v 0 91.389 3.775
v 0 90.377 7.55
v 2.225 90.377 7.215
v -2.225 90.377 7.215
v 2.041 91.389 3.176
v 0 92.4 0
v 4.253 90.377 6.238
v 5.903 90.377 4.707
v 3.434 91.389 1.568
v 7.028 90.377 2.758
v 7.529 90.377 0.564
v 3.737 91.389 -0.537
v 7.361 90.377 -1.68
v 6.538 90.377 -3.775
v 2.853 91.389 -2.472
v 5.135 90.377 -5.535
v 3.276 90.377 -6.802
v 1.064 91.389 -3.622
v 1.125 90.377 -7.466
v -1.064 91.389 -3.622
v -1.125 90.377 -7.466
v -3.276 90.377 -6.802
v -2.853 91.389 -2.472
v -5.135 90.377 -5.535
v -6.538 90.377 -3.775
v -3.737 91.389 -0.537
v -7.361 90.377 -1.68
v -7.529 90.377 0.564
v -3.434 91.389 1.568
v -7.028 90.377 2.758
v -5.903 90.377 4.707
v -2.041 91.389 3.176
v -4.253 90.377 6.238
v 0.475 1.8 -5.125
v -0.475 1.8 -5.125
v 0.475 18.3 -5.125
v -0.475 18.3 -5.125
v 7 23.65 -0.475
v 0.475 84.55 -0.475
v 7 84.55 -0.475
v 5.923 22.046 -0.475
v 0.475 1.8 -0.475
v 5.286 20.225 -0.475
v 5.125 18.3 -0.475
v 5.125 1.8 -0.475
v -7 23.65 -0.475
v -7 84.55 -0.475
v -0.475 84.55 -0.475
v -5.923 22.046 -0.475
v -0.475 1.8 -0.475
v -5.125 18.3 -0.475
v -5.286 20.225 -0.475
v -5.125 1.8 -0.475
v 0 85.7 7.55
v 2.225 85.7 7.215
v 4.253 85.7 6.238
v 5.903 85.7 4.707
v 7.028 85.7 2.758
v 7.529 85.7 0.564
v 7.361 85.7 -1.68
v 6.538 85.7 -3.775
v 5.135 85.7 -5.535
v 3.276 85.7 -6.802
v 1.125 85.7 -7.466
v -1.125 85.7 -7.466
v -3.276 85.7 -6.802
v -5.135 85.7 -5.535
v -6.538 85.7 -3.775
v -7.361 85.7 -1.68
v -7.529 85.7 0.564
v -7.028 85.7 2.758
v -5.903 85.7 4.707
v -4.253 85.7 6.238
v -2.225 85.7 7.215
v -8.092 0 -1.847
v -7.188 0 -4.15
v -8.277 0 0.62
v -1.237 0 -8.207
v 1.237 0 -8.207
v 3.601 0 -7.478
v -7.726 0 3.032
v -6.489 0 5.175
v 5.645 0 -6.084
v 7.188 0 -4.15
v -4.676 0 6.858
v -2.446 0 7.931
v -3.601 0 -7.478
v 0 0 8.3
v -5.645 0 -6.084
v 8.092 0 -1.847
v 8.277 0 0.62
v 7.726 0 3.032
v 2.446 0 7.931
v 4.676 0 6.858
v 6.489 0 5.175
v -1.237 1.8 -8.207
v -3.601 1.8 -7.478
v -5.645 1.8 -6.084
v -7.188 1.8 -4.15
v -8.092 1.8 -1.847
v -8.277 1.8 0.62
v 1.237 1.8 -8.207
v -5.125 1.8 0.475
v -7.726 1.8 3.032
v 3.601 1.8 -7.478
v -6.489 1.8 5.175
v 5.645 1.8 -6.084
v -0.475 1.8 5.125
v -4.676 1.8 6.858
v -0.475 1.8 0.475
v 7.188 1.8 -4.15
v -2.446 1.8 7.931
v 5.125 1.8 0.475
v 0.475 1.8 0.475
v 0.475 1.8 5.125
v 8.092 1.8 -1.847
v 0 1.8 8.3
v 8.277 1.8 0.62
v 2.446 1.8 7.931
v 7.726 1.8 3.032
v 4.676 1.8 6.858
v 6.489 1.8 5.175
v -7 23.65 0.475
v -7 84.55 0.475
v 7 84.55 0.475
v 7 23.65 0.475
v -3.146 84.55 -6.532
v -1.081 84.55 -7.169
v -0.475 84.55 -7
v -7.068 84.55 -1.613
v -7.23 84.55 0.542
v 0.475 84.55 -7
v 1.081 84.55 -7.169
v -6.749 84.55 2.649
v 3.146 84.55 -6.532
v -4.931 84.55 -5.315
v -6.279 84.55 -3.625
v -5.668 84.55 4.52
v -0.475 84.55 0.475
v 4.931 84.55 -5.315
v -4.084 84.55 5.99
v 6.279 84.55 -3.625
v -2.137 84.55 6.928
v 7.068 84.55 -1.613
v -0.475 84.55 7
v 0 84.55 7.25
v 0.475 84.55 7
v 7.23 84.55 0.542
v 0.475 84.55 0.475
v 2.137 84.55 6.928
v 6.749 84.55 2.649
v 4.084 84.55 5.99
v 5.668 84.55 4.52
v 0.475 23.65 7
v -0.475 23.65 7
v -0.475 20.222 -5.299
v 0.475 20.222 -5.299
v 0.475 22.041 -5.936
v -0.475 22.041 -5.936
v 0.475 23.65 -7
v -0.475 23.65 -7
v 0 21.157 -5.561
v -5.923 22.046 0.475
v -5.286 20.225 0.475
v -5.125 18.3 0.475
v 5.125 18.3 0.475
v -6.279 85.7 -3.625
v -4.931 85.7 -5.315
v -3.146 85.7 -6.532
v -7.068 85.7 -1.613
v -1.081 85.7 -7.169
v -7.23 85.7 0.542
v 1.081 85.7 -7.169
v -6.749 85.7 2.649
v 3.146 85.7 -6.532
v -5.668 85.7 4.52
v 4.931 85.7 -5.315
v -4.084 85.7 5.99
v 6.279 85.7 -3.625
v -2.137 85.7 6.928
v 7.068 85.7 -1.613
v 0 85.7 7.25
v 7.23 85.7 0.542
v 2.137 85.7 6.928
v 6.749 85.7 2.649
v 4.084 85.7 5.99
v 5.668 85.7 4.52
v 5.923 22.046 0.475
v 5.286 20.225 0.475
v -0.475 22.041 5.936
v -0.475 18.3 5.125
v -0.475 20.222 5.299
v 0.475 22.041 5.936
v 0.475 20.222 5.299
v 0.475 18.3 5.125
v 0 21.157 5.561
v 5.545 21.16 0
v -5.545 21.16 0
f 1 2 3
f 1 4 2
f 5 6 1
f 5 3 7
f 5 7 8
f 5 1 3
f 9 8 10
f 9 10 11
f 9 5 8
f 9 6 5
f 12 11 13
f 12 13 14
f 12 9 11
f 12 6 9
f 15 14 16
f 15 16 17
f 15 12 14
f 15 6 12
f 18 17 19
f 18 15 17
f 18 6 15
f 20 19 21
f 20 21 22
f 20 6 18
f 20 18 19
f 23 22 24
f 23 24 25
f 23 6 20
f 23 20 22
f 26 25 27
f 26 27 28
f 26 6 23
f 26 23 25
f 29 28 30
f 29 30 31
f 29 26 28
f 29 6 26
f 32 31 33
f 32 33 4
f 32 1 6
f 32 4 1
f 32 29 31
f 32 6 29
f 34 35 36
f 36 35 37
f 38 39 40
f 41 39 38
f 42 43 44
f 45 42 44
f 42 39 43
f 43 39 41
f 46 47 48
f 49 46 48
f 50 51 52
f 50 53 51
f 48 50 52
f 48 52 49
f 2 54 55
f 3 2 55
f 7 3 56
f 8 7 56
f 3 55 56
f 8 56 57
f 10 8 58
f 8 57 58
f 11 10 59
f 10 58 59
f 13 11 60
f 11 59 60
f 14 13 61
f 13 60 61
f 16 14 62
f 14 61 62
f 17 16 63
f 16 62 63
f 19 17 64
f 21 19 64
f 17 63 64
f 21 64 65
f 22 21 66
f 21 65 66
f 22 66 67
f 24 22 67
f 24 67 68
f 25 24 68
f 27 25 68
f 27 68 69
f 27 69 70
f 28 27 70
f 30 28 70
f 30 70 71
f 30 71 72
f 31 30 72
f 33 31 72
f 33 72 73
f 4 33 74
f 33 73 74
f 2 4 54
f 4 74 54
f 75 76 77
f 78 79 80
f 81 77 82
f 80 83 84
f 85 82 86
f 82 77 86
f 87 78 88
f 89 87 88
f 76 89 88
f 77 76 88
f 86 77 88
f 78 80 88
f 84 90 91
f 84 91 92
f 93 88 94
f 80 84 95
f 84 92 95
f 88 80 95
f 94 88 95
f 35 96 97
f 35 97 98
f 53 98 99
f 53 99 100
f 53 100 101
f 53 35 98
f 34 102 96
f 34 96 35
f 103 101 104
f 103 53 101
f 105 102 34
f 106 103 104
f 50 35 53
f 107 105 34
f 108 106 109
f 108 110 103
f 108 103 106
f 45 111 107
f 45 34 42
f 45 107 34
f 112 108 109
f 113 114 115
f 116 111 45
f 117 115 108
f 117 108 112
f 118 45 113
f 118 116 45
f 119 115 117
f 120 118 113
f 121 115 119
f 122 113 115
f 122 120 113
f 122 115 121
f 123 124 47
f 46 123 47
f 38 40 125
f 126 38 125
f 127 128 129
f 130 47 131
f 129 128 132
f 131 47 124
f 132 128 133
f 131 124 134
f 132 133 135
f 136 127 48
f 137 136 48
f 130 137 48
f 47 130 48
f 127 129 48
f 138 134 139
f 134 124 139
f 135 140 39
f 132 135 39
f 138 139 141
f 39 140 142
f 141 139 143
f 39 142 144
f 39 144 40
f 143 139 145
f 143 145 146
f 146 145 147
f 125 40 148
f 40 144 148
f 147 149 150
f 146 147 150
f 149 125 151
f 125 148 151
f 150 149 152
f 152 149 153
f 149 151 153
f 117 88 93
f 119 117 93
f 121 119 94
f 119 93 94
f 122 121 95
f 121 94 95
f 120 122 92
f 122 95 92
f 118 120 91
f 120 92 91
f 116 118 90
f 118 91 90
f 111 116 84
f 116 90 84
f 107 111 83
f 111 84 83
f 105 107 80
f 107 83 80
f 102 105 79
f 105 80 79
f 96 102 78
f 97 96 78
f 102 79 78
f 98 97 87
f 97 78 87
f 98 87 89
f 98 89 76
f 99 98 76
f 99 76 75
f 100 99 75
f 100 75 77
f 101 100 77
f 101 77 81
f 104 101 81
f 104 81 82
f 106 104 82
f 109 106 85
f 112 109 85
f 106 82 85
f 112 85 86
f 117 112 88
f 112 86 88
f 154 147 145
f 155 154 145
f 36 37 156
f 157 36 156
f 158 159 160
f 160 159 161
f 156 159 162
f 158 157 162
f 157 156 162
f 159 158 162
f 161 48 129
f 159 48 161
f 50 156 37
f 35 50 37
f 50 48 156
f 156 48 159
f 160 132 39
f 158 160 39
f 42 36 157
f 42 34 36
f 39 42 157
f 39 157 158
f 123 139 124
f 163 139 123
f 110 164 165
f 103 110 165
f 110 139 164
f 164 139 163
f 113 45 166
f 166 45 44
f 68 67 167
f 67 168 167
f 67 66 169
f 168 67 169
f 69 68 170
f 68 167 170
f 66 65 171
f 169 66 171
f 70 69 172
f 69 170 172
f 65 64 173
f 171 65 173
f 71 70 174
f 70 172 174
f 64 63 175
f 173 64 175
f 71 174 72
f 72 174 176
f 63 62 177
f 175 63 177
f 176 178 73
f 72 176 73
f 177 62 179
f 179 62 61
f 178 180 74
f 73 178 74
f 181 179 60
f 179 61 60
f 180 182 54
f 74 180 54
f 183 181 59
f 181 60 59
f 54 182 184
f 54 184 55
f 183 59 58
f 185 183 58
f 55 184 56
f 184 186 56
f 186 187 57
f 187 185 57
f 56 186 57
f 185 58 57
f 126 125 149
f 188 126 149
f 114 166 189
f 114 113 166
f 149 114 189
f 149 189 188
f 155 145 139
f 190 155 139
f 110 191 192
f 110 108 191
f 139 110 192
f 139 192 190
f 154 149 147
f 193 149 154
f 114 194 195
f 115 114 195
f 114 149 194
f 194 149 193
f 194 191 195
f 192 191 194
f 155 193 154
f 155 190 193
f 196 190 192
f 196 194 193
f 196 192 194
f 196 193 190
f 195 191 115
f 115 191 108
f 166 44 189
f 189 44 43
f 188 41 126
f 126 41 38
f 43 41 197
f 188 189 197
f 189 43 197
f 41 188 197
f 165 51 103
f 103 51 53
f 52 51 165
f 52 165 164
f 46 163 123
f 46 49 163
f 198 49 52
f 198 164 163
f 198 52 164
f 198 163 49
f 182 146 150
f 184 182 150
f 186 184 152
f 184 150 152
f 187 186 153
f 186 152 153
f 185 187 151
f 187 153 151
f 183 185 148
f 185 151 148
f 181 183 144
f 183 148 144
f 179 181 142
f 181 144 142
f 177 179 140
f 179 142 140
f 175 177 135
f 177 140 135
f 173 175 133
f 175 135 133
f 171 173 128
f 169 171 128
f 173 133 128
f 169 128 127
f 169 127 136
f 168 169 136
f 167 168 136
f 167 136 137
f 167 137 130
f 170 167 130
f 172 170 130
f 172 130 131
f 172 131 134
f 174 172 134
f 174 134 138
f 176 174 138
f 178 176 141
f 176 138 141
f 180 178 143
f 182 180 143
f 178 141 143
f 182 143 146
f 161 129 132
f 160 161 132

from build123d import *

# Parameters (mm, degrees)
SKETCH1_R               = 8.3
BOSS_EXTRUDE1_DEPTH     = 1.8
BOSS_EXTRUDE2_DEPTH     = 82.75
SKETCH3_R               = 7.25
BOSS_EXTRUDE3_DEPTH     = 1.15
SKETCH4_R               = 7.55
BOSS_EXTRUDE4_DEPTH     = 6.7
CHAMFER1_SIZE           = 2.023
CHAMFER1_SIZE2          = 7.549938784
CUT_EXTRUDE1_DEPTH      = 2
CUT_EXTRUDE1_DEPTH_BACK = 2
CUT_EXTRUDE2_DEPTH      = 2
CUT_EXTRUDE2_DEPTH_BACK = 2


with BuildPart() as part:
    # Sketch1 → Boss-Extrude1 (new body)
    with BuildSketch(Plane(origin=(0, 0, 0), x_dir=(1, 0, 0), z_dir=(0, 1, 0))):
        Circle(SKETCH1_R)
    extrude(amount=BOSS_EXTRUDE1_DEPTH)

    # Sketch2 → Boss-Extrude2 (add)
    with BuildSketch(Plane(origin=(0, 1.8, 0), x_dir=(1, 0, 0), z_dir=(0, 1, 0))):
        Polygon((-0.475, 0.475), (-0.475, 7), (0.475, 7), (0.475, 0.475), (7, 0.475), (7, -0.475), (0.475, -0.475), (0.475, -7), (-0.475, -7), (-0.475, -0.475), (-7, -0.475), (-7, 0.475), align=None)
    extrude(amount=BOSS_EXTRUDE2_DEPTH)

    # Sketch3 → Boss-Extrude3 (add)
    with BuildSketch(Plane(origin=(0, 84.55, 0), x_dir=(1, 0, 0), z_dir=(0, 1, 0))):
        Circle(SKETCH3_R)
    extrude(amount=BOSS_EXTRUDE3_DEPTH)

    # Sketch4 → Boss-Extrude4 (add)
    with BuildSketch(Plane(origin=(0, 85.7, 0), x_dir=(1, 0, 0), z_dir=(0, 1, 0))):
        Circle(SKETCH4_R)
    extrude(amount=BOSS_EXTRUDE4_DEPTH)

    # Chamfer1
    chamfer1_edges = [part.edges().sort_by_distance(p)[0] for p in [
        (-7.55, 92.4, 0),
    ]]
    chamfer1_side = [part.faces().sort_by_distance(p)[0] for p in [
        (-7.55, 89.05, 0),
    ]]
    chamfer(chamfer1_edges, length=CHAMFER1_SIZE, length2=CHAMFER1_SIZE2, reference=chamfer1_side[0])

    # Sketch7 → Cut-Extrude1 (cut, two sides: drawn at the far end of the back side and taken through both)
    with BuildSketch(Plane(origin=(0.475, 0, 0), x_dir=(0, 0, -1), z_dir=(1, 0, 0)).offset(-CUT_EXTRUDE1_DEPTH_BACK)):
        with BuildLine():
            Line((-7, 1.8), (-7, 23.65))
            add(Edge.make_bspline(
                [(-5.125, 18.3), (-5.059549187, 21.3387368), (-7, 23.65)],
                knots=[0, 0, 0, 1, 1, 1], degree=2))
            Line((-5.125, 18.3), (-5.125, 1.8))
            Line((-5.125, 1.8), (-7, 1.8))
        make_face()
        with BuildLine():
            Line((5.125, 1.8), (5.125, 18.3))
            add(Edge.make_bspline(
                [(5.125, 18.3), (5.059549187, 21.3387368), (7, 23.65)],
                knots=[0, 0, 0, 1, 1, 1], degree=2))
            Line((7, 23.65), (7, 1.8))
            Line((7, 1.8), (5.125, 1.8))
        make_face()
    extrude(amount=CUT_EXTRUDE1_DEPTH + CUT_EXTRUDE1_DEPTH_BACK, mode=Mode.SUBTRACT)

    # Sketch8 → Cut-Extrude2 (cut, two sides: drawn at the far end of the back side and taken through both)
    with BuildSketch(Plane.XY.offset(-CUT_EXTRUDE2_DEPTH_BACK)):
        with BuildLine():
            Line((-7, 1.8), (-7, 23.65))
            add(Edge.make_bspline(
                [(-5.125, 18.3), (-5.02840034, 21.345891772), (-7, 23.65)],
                knots=[0, 0, 0, 1, 1, 1], degree=2))
            Line((-5.125, 18.3), (-5.125, 1.8))
            Line((-5.125, 1.8), (-7, 1.8))
        make_face()
        with BuildLine():
            Line((7, 1.8), (5.125, 1.8))
            Line((5.125, 1.8), (5.125, 18.3))
            add(Edge.make_bspline(
                [(5.125, 18.3), (5.02840034, 21.345891772), (7, 23.65)],
                knots=[0, 0, 0, 1, 1, 1], degree=2))
            Line((7, 23.65), (7, 1.8))
        make_face()
    extrude(amount=CUT_EXTRUDE2_DEPTH + CUT_EXTRUDE2_DEPTH_BACK, mode=Mode.SUBTRACT)


solid = part.part
